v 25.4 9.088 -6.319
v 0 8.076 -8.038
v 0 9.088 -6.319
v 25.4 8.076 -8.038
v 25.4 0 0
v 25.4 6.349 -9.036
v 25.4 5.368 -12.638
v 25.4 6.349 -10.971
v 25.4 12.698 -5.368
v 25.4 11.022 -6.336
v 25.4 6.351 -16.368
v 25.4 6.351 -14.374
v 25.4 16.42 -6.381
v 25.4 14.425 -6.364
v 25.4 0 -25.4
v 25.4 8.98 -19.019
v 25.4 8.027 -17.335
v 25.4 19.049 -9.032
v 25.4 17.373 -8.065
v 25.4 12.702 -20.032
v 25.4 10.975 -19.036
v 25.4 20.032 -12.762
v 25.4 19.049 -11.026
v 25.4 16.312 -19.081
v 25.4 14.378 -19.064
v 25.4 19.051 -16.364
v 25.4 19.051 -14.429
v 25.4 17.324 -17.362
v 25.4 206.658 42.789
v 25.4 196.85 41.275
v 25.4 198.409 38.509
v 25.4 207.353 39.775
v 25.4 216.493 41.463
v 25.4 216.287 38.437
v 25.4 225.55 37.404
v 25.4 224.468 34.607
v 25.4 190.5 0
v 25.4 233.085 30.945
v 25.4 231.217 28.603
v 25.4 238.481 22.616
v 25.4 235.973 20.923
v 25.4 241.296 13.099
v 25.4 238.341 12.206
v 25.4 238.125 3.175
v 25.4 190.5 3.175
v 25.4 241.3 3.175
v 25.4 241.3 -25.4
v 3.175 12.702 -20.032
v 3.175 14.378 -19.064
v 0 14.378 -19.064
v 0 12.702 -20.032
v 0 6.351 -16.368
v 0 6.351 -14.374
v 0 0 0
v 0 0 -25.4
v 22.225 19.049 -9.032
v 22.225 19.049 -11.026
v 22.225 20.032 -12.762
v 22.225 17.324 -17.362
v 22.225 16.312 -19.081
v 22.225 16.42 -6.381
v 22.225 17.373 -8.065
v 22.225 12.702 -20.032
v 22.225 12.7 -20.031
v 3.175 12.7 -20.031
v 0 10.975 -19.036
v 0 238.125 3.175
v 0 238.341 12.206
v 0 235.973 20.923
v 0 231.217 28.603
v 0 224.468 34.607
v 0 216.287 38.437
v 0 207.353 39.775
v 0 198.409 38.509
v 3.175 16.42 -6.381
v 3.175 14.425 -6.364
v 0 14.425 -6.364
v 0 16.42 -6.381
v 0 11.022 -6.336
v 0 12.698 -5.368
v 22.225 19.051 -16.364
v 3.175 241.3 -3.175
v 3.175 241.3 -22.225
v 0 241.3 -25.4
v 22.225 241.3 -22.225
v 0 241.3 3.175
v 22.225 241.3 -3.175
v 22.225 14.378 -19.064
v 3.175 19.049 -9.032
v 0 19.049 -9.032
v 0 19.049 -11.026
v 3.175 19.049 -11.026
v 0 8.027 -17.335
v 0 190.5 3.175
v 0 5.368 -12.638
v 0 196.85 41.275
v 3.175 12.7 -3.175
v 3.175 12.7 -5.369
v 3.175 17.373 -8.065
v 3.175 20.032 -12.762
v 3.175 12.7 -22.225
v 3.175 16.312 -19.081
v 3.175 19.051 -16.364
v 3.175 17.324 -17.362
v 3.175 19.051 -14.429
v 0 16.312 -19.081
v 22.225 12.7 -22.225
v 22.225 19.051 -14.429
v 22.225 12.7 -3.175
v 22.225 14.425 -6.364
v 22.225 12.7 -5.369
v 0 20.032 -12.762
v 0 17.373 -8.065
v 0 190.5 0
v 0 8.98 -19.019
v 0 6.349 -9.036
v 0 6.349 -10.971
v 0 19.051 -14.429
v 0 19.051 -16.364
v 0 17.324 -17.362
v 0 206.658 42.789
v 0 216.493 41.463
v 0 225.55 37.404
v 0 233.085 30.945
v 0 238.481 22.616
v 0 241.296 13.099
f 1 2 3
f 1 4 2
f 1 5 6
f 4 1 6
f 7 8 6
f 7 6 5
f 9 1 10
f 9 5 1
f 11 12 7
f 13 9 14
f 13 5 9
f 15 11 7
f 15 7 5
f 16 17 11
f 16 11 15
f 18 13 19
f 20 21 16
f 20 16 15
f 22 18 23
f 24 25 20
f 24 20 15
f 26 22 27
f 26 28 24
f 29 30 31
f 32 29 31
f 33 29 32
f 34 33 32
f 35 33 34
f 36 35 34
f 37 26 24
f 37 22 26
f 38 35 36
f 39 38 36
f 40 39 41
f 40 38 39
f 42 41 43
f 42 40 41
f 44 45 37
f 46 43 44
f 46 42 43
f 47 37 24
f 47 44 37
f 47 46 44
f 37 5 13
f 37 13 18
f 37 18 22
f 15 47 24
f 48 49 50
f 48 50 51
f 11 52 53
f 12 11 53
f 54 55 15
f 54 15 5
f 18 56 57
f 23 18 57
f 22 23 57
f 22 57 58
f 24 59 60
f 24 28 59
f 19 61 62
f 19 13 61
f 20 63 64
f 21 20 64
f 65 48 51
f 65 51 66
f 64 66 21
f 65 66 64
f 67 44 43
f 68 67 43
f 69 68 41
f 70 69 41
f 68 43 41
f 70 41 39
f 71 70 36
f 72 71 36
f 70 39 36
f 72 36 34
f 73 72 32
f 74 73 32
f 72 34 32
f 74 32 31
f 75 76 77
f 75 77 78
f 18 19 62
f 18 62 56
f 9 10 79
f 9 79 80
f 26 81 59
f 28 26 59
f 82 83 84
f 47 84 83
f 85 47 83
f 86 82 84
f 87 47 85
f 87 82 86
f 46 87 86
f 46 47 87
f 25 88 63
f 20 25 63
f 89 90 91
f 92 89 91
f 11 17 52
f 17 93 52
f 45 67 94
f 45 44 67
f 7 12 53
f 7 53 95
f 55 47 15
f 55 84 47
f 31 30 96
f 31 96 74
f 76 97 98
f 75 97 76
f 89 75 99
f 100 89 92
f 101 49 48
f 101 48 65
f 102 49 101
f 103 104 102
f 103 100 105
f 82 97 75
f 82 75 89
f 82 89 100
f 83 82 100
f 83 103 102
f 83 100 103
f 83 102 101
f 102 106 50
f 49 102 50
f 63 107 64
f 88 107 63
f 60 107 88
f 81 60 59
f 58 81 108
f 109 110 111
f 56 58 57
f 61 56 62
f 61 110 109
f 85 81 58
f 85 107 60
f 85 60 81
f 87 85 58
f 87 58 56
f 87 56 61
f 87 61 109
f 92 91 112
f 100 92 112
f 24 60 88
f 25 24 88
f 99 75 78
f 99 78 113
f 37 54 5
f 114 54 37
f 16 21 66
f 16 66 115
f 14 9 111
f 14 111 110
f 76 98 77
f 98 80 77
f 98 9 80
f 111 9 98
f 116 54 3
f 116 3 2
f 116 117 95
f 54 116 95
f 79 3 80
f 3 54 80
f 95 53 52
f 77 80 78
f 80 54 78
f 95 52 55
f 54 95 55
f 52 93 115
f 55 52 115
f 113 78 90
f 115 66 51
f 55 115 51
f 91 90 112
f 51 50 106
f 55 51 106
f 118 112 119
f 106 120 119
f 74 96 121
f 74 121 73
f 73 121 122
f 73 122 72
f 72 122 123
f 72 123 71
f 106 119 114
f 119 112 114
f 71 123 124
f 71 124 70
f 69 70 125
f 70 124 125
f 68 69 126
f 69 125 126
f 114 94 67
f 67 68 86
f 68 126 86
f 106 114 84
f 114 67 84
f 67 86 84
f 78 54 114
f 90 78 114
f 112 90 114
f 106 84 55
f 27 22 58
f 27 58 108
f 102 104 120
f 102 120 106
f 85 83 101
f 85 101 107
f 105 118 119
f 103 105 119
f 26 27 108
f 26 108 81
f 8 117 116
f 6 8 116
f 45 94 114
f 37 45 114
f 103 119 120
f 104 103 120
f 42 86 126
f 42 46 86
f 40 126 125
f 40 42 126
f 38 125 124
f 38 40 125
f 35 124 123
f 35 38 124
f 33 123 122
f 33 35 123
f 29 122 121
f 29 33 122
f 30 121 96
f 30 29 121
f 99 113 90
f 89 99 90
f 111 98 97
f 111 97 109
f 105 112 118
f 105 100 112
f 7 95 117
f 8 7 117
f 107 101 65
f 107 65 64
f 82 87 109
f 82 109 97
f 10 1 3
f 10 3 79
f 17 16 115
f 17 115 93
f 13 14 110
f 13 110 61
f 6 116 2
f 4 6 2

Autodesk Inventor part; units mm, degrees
ref_plane "YZ Plane" through (0, 0, 0) normal (1, 0, 0) x (0, 1, 0)
ref_plane "XZ Plane" through (0, 0, 0) normal (0, 1, 0) x (-1, 0, 0)
ref_plane "XY Plane" through (0, 0, 0) normal (0, 0, 1) x (1, 0, 0)
sketch "Sketch1" plane through (0, 0, 0) normal (1, 0, 0) x (0, 1, 0)
  line L0 (0, 0) -> (241.3, 0)
  line L1 (241.3, 0) -> (241.3, -25.4)
  line L2 (241.3, -25.4) -> (0, -25.4)
  line L3 (0, -25.4) -> (0, 0)
  line L4 (6.3489, -9.0357) -> (12.6978, -5.3677)
  line L5 (12.6978, -5.3677) -> (19.0489, -9.0319)
  line L6 (19.0489, -9.0319) -> (19.0511, -16.3643)
  line L7 (19.0511, -16.3643) -> (12.7022, -20.0323)
  line L8 (12.7022, -20.0323) -> (6.3511, -16.3681)
  line L9 (6.3511, -16.3681) -> (6.3489, -9.0357)
  point P0 (12.7, -12.7)
  dimension "d0" = 241.3
  dimension "d1" = 25.4
  dimension "d3" = 12.7
  dimension "d4" = 12.7
extrude "Extrusion1" add sketch "Sketch1" along normal blind 25.4
sketch "Sketch2" plane through (0, 241.3, 0) normal (0, 1, 0) x (1, 0, 0)
  line L0 (0, 25.4) -> (25.4, 25.4) projected
  line L1 (0, 0) -> (25.4, 0)
  line L2 (25.4, 0) -> (25.4, 25.4)
  line L3 (25.4, 25.4) -> (0, 25.4)
  line L4 (0, 25.4) -> (0, 0)
  line L5 (22.225, 3.175) -> (3.175, 3.175)
  line L6 (3.175, 3.175) -> (3.175, 22.225)
  line L7 (3.175, 22.225) -> (22.225, 22.225)
  line L8 (22.225, 22.225) -> (22.225, 3.175)
  dimension "d7" = 3.175
extrude "Extrusion2" cut sketch "Sketch2" against normal blind 228.6 contours L5 L6 L7 L8
sketch "Sketch3" plane through (25.4, 0, 0) normal (1, 0, 0) x (0, 0, -1)
  line L0 (0, 241.3) -> (0, 190.5)
  line L1 (0, 0) -> (0, 241.3) projected
  line L2 (0, 241.3) -> (-3.175, 241.3)
  line L3 (-3.175, 241.3) -> (-3.175, 190.5)
  line L4 (-3.175, 190.5) -> (0, 190.5)
  line L5 (0, 190.5) -> (0, 241.3)
  arc A0 (-3.175, 241.3) -> (-46.143, 196.9282) centre (-8.4506, 203.4185) ccw
  line L6 (-3.175, 241.3) -> (-3.175, 238.125)
  arc A1 (-3.175, 238.125) -> (-42.9327, 197.9157) centre (-7.6224, 202.7623) ccw
  line L7 (-42.9327, 197.9157) -> (-46.143, 196.9282)
  dimension "d11" = 50.8
  dimension "d13" = 3.175
  dimension "d15" = 3.175
extrude "Extrusion3" add sketch "Sketch3" against normal blind 25.4 contours L0 L4 L3 L2
sketch "Sketch4" plane through (25.4, 0, 0) normal (1, 0, 0) x (0, 0, -1)
  point P0 (0, 0)
sketch "Sketch5" plane through (25.4, 0, 0) normal (1, 0, 0) x (0, 0, -1)
  line L0 (-3.175, 241.3) -> (-3.175, 190.5) projected
  line L1 (-3.175, 241.3) -> (-3.175, 196.85)
  line L2 (-3.175, 196.85) -> (-41.275, 196.85)
  arc A0 (-3.175, 241.3) -> (-41.275, 196.85) centre (-8.1247, 206.989) ccw
  line L3 (-41.275, 196.85) -> (-38.5091, 198.4089)
  line L4 (-3.175, 241.3) -> (-3.175, 238.125)
  arc A1 (-3.175, 238.125) -> (-38.5091, 198.4089) centre (-8.433, 207.227) ccw
  point P0 (0, 0)
  dimension "d18" = 44.45
  dimension "d19" = 38.1
  dimension "d20" = 3.175
  dimension "d21" = 3.175
extrude "Extrusion4" add sketch "Sketch5" against normal blind 25.4 contours L0 A1 L3 A0
sketch "Sketch6" plane through (25.4, 0, 0) normal (1, 0, 0) x (0, 0, -1)
  line L0 (0, 0) -> (25.4, 0) projected
  line L1 (25.4, 0) -> (25.4, 241.3) projected
  line L2 (12.7618, 20.0321) -> (19.0807, 16.3125)
  line L3 (19.0807, 16.3125) -> (19.0189, 8.9804)
  line L4 (19.0189, 8.9804) -> (12.6382, 5.3679)
  line L5 (12.6382, 5.3679) -> (6.3193, 9.0875)
  line L6 (6.3193, 9.0875) -> (6.3811, 16.4196)
  line L7 (6.3811, 16.4196) -> (12.7618, 20.0321)
  point P0 (12.7, 12.7)
  point P1 (12.7, 12.7)
  dimension "d25" = 12.7
  dimension "d26" = 12.7
  dimension "d27" = 12.7
extrude "Extrusion5" cut sketch "Sketch6" against normal blind 25.4
properties part number "claw"
